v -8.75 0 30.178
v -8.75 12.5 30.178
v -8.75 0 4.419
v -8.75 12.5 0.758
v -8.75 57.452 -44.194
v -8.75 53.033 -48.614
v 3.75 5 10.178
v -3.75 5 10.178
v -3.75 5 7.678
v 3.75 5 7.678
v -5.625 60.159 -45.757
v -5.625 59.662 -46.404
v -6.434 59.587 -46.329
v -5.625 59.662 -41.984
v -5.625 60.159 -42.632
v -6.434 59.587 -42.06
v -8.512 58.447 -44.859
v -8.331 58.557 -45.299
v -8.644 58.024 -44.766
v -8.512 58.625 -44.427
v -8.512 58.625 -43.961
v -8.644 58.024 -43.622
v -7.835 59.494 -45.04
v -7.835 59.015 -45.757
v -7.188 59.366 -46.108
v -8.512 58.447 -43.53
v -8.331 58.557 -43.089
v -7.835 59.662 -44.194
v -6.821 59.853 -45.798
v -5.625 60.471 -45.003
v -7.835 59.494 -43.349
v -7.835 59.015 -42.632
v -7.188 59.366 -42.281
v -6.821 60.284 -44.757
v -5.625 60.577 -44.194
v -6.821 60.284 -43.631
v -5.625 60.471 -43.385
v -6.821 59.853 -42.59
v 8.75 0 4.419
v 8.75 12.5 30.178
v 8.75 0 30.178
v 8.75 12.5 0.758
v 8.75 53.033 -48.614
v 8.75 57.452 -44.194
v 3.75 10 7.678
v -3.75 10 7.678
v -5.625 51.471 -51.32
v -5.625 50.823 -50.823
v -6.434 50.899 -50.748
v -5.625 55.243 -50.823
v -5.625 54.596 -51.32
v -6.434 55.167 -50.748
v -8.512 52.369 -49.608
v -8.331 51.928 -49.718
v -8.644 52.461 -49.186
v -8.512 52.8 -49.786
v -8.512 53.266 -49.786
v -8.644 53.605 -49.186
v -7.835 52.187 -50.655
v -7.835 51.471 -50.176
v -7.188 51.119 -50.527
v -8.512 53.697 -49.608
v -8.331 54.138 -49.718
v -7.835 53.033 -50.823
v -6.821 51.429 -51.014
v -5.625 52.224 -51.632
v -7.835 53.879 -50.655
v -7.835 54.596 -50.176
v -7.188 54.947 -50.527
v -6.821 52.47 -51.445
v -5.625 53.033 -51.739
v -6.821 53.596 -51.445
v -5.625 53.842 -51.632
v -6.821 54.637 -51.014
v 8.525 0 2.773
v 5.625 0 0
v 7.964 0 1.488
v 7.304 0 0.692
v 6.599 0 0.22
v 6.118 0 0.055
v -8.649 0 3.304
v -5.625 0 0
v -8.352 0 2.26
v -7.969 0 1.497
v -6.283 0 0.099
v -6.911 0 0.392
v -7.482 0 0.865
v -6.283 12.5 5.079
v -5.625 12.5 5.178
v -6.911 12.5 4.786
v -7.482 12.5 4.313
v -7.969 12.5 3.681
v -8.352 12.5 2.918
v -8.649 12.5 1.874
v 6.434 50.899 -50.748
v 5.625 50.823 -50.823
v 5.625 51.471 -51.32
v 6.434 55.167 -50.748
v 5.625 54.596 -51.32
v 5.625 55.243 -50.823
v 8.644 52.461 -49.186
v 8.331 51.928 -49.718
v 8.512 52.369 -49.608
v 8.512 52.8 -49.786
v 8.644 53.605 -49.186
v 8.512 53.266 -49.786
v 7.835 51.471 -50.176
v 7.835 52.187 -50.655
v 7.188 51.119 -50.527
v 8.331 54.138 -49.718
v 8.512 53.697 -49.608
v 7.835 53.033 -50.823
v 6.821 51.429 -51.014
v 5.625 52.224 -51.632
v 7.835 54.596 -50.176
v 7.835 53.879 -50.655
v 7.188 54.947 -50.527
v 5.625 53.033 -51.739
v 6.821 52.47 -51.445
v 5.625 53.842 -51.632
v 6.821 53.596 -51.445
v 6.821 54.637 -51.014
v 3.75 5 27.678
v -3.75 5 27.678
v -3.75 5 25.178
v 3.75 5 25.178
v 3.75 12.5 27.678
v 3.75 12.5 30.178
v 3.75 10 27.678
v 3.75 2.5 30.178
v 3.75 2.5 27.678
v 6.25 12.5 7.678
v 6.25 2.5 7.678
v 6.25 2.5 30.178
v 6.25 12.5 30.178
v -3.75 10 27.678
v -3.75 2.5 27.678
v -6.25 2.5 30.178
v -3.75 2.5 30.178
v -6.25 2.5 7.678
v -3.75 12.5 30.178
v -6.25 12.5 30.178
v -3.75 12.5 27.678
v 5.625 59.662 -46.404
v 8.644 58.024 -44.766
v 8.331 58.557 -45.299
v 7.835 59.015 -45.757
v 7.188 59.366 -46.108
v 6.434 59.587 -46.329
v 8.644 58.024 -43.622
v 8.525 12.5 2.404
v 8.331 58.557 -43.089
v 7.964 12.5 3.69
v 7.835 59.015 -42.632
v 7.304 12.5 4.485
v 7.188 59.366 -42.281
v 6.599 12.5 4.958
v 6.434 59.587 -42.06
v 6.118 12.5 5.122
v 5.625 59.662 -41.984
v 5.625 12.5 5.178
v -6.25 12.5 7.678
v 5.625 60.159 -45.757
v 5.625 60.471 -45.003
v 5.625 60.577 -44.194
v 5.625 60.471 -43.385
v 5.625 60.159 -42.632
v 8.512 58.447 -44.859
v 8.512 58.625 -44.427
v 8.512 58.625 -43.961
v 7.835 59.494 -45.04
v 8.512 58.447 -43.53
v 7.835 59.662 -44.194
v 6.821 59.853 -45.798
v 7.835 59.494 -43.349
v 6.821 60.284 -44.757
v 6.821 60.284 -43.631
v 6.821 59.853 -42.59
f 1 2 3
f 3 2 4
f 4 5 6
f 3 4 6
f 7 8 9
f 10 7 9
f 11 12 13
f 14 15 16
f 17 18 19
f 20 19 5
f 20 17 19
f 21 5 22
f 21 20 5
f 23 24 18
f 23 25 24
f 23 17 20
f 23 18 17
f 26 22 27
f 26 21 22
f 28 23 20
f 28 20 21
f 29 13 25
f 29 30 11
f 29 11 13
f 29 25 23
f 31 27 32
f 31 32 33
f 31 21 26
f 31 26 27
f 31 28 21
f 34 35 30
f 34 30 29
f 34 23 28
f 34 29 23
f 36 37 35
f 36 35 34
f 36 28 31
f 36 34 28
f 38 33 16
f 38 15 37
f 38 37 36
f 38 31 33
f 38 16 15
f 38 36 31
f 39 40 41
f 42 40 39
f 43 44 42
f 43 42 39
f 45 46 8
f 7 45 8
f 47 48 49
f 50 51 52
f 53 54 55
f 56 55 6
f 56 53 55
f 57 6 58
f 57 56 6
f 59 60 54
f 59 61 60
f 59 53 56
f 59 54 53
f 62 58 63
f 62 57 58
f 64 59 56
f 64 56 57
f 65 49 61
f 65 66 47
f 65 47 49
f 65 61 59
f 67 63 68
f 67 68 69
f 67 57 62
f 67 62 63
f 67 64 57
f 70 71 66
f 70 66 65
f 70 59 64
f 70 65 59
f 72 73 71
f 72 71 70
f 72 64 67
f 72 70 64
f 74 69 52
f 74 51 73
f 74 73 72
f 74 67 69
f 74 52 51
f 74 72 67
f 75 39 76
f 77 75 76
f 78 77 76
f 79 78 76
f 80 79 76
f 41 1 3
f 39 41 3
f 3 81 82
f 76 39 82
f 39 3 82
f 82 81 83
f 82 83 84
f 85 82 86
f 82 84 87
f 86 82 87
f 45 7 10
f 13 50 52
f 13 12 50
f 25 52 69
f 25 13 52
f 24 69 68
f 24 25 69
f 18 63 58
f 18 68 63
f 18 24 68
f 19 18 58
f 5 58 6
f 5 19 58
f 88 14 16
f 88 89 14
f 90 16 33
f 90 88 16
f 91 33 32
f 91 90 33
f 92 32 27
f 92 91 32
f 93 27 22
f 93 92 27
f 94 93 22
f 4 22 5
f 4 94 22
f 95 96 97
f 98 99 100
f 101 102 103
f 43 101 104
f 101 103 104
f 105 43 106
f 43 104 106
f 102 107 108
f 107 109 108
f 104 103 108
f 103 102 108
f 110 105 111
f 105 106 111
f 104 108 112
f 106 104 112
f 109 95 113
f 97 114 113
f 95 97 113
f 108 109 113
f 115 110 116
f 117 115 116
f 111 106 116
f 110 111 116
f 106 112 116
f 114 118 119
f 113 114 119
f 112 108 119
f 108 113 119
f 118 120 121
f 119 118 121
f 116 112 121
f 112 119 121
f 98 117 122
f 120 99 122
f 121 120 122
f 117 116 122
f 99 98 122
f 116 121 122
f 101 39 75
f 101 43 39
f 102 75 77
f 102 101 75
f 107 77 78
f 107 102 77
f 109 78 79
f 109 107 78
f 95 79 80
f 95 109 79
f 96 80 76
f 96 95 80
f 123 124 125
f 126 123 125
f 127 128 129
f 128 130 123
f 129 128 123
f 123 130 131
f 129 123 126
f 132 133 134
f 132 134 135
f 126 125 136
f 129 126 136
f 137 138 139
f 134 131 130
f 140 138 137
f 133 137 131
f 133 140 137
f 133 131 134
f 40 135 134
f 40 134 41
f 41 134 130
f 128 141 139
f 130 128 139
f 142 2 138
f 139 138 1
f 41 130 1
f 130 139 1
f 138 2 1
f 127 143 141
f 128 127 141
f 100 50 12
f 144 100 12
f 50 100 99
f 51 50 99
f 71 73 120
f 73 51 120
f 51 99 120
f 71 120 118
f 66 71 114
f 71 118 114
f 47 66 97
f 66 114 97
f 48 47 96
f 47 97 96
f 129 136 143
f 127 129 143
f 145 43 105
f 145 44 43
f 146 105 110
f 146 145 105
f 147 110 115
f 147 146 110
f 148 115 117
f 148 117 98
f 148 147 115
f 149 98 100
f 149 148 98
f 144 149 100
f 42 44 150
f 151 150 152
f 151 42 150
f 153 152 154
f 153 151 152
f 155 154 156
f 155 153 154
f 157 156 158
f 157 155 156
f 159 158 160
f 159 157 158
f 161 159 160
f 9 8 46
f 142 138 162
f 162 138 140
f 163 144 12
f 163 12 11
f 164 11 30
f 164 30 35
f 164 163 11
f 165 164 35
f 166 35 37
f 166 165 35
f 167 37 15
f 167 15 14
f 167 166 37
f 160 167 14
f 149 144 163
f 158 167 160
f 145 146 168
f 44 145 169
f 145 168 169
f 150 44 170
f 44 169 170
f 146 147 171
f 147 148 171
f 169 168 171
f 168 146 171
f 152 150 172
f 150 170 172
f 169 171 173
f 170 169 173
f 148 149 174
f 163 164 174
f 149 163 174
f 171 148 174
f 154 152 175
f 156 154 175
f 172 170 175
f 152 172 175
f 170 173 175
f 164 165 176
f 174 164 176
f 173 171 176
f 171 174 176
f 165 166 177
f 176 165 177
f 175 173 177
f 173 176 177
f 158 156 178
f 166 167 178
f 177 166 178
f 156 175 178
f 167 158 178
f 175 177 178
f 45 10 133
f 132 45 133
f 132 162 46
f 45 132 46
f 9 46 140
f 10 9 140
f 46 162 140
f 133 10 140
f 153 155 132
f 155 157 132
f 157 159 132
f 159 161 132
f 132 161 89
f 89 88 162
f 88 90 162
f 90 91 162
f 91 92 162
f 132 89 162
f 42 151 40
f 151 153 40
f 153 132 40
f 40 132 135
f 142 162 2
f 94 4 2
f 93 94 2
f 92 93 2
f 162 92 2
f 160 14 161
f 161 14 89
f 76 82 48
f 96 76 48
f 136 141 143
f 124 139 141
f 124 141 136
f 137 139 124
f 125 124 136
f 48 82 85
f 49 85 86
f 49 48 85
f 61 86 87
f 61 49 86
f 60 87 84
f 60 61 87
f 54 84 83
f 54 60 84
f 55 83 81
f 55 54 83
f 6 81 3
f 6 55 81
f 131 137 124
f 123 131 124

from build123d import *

# Parameters (mm, degrees)
BOSS_EXTRUDE1_DEPTH      = 8.75
BOSS_EXTRUDE1_DEPTH_BACK = 8.75
BOSS_EXTRUDE2_REACH      = 83.958
SKETCH2_W                = 2.5
SKETCH2_H                = 12.5
CUT_EXTRUDE1_START       = 2.5
SKETCH3_W                = 2.5
SKETCH3_H                = 22.5
CUT_EXTRUDE1_DEPTH       = 80.458449839
FILLET1_R                = 3.125


with BuildPart() as part:
    # Sketch1 → Boss-Extrude1 (new, two sides: drawn at the far end of the back side and taken through both)
    with BuildSketch(Plane(origin=(0, 0, 0), x_dir=(0, 0, -1), z_dir=(1, 0, 0)).offset(-BOSS_EXTRUDE1_DEPTH_BACK)):
        Polygon((-27.67766953, 2.5), (-27.67766953, 5), (-25.17766953, 5), (-27.67766953, 10), (-27.67766953, 12.5), (-30.17766953, 12.5), (-30.17766953, 0), (0, 0), (53.033008589, 53.033008589), (44.194173824, 61.871843354), (-5.17766953, 12.5), (-7.67766953, 12.5), (-7.67766953, 10), (-10.17766953, 5), (-7.67766953, 5), (-7.67766953, 2.5), align=None)
    extrude(amount=BOSS_EXTRUDE1_DEPTH + BOSS_EXTRUDE1_DEPTH_BACK)

    # Boss-Extrude2: up to this face of the body (flat: up to its plane)
    boss_extrude2_end = Plane(part.part.faces().sort_by_distance((0, 6.25, 30.17766953))[0])
    # Sketch2 → Boss-Extrude2 (add, up to the picked face)
    with BuildSketch(Plane.XY, mode=Mode.PRIVATE) as boss_extrude2_sk1:
        with Locations((-7.5, 6.25)):
            Rectangle(SKETCH2_W, SKETCH2_H)
    boss_extrude2_tool1 = split(extrude(boss_extrude2_sk1.sketch, amount=BOSS_EXTRUDE2_REACH, mode=Mode.PRIVATE), bisect_by=boss_extrude2_end, keep=Keep.BOTH, mode=Mode.PRIVATE)
    # Sketch2 → Boss-Extrude2 (add, up to the picked face)
    with BuildSketch(Plane.XY, mode=Mode.PRIVATE) as boss_extrude2_sk2:
        with Locations((7.5, 6.25)):
            Rectangle(SKETCH2_W, SKETCH2_H)
    boss_extrude2_tool2 = split(extrude(boss_extrude2_sk2.sketch, amount=BOSS_EXTRUDE2_REACH, mode=Mode.PRIVATE), bisect_by=boss_extrude2_end, keep=Keep.BOTH, mode=Mode.PRIVATE)
    add(boss_extrude2_tool1.solids().sort_by(Axis((-7.5, 6.25, 0), (0, 0, 1)))[0])
    add(boss_extrude2_tool2.solids().sort_by(Axis((7.5, 6.25, 0), (0, 0, 1)))[0])

    # Sketch3 → Cut-Extrude1 (cut, through all)
    with BuildSketch(Plane(origin=(0, 0, 0), x_dir=(1, 0, 0), z_dir=(0, 1, 0)).offset(CUT_EXTRUDE1_START)):
        with Locations((-5, -18.92766953)):
            Rectangle(SKETCH3_W, SKETCH3_H)
        with Locations((5, -18.92766953)):
            Rectangle(SKETCH3_W, SKETCH3_H)
    extrude(amount=CUT_EXTRUDE1_DEPTH, mode=Mode.SUBTRACT)

    # Fillet1
    fillet1_edges = [part.edges().sort_by_distance(p)[0] for p in [
        (0, 61.871843354, -44.194173824),
        (0, 53.033008589, -53.033008589),
        (-8.75, 26.516504294, -26.516504294),
        (-8.75, 57.452425971, -48.613591207),
        (-8.75, 37.185921677, -19.508252147),
        (8.75, 26.516504294, -26.516504294),
        (8.75, 57.452425971, -48.613591207),
        (8.75, 37.185921677, -19.508252147),
    ]]
    fillet(fillet1_edges, radius=FILLET1_R)


solid = part.part
